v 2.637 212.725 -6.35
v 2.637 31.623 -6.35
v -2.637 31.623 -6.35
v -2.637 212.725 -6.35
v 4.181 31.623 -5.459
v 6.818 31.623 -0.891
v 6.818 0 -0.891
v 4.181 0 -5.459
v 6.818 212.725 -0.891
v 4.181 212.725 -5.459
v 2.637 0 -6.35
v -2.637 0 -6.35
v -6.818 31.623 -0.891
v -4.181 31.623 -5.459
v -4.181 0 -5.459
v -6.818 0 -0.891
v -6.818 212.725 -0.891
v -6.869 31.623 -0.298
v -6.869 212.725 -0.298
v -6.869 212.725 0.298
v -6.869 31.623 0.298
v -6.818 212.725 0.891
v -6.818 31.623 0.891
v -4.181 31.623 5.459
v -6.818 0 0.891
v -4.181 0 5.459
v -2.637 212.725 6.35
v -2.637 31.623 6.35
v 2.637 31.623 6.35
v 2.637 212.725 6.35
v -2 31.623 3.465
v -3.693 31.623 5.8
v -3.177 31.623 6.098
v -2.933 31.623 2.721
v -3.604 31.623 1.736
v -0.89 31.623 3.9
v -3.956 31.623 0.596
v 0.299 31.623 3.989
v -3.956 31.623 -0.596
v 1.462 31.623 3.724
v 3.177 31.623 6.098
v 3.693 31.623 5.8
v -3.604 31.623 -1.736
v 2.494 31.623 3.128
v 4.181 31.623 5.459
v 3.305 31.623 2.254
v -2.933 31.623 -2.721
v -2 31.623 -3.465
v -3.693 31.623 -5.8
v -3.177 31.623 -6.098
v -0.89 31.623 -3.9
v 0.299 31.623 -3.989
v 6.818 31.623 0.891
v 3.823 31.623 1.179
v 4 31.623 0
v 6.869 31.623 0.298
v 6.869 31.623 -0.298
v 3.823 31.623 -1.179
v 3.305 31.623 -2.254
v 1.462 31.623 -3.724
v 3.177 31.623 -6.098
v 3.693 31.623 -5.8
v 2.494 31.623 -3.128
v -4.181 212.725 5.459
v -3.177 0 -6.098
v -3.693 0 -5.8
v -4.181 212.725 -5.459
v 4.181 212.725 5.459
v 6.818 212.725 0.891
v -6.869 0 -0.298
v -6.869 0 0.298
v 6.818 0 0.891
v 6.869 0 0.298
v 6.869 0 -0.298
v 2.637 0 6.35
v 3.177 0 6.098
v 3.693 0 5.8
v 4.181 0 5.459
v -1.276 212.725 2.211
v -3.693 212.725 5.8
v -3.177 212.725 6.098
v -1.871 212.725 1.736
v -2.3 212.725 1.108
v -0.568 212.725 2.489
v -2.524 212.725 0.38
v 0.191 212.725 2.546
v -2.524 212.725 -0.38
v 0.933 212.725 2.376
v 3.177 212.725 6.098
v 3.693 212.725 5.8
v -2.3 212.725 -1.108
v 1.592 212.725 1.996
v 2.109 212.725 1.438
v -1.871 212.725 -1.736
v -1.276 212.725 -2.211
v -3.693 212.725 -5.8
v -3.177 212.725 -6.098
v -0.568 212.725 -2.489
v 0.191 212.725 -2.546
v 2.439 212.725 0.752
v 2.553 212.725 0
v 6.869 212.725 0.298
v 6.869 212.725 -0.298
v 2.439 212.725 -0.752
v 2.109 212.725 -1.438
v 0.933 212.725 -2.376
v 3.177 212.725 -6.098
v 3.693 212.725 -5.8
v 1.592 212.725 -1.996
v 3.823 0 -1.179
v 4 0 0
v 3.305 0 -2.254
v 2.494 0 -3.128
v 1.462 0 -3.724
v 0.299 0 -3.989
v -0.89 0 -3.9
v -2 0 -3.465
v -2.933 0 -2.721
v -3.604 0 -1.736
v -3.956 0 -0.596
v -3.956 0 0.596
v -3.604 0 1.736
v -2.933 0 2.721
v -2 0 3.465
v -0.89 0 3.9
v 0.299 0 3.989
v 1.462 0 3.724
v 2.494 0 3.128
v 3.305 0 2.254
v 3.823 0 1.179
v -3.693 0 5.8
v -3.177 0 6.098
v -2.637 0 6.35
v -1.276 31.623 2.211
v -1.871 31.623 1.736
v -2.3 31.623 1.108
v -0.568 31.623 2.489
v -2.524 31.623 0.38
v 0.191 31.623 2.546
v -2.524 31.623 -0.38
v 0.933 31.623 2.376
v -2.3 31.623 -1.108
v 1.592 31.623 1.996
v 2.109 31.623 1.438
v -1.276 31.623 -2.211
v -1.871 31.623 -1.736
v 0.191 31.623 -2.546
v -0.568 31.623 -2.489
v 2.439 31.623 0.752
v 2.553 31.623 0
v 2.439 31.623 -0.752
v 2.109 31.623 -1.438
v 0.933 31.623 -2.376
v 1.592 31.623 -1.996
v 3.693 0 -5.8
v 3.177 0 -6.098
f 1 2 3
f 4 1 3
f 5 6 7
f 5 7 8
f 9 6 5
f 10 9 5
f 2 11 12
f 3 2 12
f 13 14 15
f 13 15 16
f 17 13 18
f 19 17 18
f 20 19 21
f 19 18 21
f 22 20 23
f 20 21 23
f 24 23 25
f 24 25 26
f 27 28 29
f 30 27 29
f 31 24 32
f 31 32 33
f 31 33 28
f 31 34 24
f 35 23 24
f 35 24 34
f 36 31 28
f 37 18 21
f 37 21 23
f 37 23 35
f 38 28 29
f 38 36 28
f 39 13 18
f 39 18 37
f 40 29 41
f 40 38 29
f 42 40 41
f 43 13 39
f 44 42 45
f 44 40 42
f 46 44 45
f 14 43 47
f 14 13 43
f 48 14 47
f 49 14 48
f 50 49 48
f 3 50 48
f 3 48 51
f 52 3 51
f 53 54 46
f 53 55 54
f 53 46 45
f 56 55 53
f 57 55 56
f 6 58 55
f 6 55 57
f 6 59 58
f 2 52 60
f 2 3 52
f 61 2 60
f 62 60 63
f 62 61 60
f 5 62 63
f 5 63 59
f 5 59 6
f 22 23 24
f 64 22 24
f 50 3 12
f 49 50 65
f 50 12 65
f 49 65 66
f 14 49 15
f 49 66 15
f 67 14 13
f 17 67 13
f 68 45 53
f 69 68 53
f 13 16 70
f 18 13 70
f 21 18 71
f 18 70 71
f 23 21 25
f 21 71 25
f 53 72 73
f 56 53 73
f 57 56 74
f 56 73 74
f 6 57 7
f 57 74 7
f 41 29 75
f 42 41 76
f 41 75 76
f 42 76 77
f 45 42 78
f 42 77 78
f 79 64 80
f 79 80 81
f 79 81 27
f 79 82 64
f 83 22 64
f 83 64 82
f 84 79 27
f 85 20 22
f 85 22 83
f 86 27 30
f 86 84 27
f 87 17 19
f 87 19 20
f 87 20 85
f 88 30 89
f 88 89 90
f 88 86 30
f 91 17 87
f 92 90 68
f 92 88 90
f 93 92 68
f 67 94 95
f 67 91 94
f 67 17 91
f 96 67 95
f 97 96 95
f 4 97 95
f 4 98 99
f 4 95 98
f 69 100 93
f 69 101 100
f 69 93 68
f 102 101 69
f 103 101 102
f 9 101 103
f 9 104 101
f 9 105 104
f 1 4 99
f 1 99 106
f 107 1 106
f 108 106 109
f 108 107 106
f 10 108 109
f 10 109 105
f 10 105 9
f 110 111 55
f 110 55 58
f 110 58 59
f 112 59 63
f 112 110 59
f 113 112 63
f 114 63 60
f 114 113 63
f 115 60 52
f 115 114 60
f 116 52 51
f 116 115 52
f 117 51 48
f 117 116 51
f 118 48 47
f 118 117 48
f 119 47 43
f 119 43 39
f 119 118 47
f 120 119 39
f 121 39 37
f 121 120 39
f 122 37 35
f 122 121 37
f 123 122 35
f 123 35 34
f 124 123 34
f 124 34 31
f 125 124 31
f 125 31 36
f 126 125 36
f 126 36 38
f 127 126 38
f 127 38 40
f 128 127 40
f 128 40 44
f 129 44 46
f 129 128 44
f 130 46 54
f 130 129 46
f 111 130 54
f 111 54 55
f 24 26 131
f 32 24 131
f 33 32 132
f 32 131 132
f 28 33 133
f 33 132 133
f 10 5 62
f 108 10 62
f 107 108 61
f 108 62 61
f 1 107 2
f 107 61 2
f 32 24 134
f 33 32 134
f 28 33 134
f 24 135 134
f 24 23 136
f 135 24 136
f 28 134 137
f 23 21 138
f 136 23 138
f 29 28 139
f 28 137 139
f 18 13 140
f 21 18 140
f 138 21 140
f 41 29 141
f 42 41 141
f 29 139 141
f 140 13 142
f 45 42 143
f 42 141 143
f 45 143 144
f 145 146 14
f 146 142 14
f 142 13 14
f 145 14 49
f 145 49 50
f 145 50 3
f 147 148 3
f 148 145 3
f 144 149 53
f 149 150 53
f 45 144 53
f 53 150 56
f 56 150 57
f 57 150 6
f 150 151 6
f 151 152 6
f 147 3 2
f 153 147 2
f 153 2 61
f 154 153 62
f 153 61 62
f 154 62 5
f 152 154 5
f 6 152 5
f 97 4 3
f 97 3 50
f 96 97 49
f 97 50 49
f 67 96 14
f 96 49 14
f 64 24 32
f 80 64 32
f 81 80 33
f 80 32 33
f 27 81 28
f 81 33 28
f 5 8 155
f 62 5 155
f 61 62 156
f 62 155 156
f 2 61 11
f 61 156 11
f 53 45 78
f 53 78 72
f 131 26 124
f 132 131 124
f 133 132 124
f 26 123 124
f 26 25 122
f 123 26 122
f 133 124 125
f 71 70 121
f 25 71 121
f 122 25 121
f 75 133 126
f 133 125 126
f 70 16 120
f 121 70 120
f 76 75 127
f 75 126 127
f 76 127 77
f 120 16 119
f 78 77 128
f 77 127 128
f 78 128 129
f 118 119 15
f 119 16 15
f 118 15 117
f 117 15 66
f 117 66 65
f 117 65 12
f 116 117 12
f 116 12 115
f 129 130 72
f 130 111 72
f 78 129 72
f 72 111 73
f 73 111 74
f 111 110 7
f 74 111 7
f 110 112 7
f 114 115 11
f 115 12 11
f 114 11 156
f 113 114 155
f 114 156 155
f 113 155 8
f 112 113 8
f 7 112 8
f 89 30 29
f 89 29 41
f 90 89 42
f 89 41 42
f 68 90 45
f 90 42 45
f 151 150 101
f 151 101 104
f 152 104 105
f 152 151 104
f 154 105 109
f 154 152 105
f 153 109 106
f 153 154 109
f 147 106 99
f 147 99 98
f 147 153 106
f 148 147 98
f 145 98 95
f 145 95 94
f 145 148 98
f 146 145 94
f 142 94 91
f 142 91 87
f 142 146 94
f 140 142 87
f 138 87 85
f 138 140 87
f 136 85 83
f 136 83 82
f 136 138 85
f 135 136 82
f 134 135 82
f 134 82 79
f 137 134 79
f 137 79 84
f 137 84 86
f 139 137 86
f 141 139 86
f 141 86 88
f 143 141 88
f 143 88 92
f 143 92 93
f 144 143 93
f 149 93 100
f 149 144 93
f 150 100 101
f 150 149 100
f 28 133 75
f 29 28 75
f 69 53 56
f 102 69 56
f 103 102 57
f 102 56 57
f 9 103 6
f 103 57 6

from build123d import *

# Parameters (mm, degrees)
SKETCH1_R           = 4.0005
BOSS_EXTRUDE1_DEPTH = 31.623
SKETCH2_R           = 2.5527
BOSS_EXTRUDE2_DEPTH = 181.102


with BuildPart() as part:
    # Sketch1 → Boss-Extrude1 (new body)
    with BuildSketch(Plane(origin=(0, 0, 0), x_dir=(1, 0, 0), z_dir=(0, 1, 0))):
        with BuildLine():
            Line((6.817769051, 0.89127761), (4.180753577, 5.45872239))
            ThreePointArc((4.180753577, 5.45872239), (3.43789, 5.954600151), (2.637015474, 6.35))
            Line((2.637015474, 6.35), (-2.637015474, 6.35))
            ThreePointArc((-2.637015474, 6.35), (-3.43789, 5.954600151), (-4.180753577, 5.45872239))
            Line((-4.180753577, 5.45872239), (-6.817769051, 0.89127761))
            ThreePointArc((-6.817769051, 0.89127761), (-6.87578, 0), (-6.817769051, -0.89127761))
            Line((-6.817769051, -0.89127761), (-4.180753577, -5.45872239))
            ThreePointArc((-4.180753577, -5.45872239), (-3.43789, -5.954600151), (-2.637015474, -6.35))
            Line((-2.637015474, -6.35), (2.637015474, -6.35))
            ThreePointArc((2.637015474, -6.35), (3.43789, -5.954600151), (4.180753577, -5.45872239))
            Line((4.180753577, -5.45872239), (6.817769051, -0.89127761))
            ThreePointArc((6.817769051, -0.89127761), (6.87578, 0), (6.817769051, 0.89127761))
        make_face()
        Circle(SKETCH1_R, mode=Mode.SUBTRACT)
    extrude(amount=BOSS_EXTRUDE1_DEPTH)


with BuildPart() as body_2:
    # Sketch2 → Boss-Extrude2 (new body)
    with BuildSketch(Plane(origin=(0, 31.623, 0), x_dir=(1, 0, 0), z_dir=(0, 1, 0))):
        with BuildLine():
            Line((2.637015474, 6.35), (-2.637015474, 6.35))
            ThreePointArc((-2.637015474, 6.35), (-3.43789, 5.954600151), (-4.180753577, 5.45872239))
            Line((-4.180753577, 5.45872239), (-6.817769051, 0.89127761))
            ThreePointArc((-6.817769051, 0.89127761), (-6.87578, 0), (-6.817769051, -0.89127761))
            Line((-6.817769051, -0.89127761), (-4.180753577, -5.45872239))
            ThreePointArc((-4.180753577, -5.45872239), (-3.43789, -5.954600151), (-2.637015474, -6.35))
            Line((-2.637015474, -6.35), (2.637015474, -6.35))
            ThreePointArc((2.637015474, -6.35), (3.43789, -5.954600151), (4.180753577, -5.45872239))
            Line((4.180753577, -5.45872239), (6.817769051, -0.89127761))
            ThreePointArc((6.817769051, -0.89127761), (6.87578, 0), (6.817769051, 0.89127761))
            Line((6.817769051, 0.89127761), (4.180753577, 5.45872239))
            ThreePointArc((4.180753577, 5.45872239), (3.43789, 5.954600151), (2.637015474, 6.35))
        make_face()
        Circle(SKETCH2_R, mode=Mode.SUBTRACT)
    extrude(amount=BOSS_EXTRUDE2_DEPTH)


solid = Compound([part.part, body_2.part])
